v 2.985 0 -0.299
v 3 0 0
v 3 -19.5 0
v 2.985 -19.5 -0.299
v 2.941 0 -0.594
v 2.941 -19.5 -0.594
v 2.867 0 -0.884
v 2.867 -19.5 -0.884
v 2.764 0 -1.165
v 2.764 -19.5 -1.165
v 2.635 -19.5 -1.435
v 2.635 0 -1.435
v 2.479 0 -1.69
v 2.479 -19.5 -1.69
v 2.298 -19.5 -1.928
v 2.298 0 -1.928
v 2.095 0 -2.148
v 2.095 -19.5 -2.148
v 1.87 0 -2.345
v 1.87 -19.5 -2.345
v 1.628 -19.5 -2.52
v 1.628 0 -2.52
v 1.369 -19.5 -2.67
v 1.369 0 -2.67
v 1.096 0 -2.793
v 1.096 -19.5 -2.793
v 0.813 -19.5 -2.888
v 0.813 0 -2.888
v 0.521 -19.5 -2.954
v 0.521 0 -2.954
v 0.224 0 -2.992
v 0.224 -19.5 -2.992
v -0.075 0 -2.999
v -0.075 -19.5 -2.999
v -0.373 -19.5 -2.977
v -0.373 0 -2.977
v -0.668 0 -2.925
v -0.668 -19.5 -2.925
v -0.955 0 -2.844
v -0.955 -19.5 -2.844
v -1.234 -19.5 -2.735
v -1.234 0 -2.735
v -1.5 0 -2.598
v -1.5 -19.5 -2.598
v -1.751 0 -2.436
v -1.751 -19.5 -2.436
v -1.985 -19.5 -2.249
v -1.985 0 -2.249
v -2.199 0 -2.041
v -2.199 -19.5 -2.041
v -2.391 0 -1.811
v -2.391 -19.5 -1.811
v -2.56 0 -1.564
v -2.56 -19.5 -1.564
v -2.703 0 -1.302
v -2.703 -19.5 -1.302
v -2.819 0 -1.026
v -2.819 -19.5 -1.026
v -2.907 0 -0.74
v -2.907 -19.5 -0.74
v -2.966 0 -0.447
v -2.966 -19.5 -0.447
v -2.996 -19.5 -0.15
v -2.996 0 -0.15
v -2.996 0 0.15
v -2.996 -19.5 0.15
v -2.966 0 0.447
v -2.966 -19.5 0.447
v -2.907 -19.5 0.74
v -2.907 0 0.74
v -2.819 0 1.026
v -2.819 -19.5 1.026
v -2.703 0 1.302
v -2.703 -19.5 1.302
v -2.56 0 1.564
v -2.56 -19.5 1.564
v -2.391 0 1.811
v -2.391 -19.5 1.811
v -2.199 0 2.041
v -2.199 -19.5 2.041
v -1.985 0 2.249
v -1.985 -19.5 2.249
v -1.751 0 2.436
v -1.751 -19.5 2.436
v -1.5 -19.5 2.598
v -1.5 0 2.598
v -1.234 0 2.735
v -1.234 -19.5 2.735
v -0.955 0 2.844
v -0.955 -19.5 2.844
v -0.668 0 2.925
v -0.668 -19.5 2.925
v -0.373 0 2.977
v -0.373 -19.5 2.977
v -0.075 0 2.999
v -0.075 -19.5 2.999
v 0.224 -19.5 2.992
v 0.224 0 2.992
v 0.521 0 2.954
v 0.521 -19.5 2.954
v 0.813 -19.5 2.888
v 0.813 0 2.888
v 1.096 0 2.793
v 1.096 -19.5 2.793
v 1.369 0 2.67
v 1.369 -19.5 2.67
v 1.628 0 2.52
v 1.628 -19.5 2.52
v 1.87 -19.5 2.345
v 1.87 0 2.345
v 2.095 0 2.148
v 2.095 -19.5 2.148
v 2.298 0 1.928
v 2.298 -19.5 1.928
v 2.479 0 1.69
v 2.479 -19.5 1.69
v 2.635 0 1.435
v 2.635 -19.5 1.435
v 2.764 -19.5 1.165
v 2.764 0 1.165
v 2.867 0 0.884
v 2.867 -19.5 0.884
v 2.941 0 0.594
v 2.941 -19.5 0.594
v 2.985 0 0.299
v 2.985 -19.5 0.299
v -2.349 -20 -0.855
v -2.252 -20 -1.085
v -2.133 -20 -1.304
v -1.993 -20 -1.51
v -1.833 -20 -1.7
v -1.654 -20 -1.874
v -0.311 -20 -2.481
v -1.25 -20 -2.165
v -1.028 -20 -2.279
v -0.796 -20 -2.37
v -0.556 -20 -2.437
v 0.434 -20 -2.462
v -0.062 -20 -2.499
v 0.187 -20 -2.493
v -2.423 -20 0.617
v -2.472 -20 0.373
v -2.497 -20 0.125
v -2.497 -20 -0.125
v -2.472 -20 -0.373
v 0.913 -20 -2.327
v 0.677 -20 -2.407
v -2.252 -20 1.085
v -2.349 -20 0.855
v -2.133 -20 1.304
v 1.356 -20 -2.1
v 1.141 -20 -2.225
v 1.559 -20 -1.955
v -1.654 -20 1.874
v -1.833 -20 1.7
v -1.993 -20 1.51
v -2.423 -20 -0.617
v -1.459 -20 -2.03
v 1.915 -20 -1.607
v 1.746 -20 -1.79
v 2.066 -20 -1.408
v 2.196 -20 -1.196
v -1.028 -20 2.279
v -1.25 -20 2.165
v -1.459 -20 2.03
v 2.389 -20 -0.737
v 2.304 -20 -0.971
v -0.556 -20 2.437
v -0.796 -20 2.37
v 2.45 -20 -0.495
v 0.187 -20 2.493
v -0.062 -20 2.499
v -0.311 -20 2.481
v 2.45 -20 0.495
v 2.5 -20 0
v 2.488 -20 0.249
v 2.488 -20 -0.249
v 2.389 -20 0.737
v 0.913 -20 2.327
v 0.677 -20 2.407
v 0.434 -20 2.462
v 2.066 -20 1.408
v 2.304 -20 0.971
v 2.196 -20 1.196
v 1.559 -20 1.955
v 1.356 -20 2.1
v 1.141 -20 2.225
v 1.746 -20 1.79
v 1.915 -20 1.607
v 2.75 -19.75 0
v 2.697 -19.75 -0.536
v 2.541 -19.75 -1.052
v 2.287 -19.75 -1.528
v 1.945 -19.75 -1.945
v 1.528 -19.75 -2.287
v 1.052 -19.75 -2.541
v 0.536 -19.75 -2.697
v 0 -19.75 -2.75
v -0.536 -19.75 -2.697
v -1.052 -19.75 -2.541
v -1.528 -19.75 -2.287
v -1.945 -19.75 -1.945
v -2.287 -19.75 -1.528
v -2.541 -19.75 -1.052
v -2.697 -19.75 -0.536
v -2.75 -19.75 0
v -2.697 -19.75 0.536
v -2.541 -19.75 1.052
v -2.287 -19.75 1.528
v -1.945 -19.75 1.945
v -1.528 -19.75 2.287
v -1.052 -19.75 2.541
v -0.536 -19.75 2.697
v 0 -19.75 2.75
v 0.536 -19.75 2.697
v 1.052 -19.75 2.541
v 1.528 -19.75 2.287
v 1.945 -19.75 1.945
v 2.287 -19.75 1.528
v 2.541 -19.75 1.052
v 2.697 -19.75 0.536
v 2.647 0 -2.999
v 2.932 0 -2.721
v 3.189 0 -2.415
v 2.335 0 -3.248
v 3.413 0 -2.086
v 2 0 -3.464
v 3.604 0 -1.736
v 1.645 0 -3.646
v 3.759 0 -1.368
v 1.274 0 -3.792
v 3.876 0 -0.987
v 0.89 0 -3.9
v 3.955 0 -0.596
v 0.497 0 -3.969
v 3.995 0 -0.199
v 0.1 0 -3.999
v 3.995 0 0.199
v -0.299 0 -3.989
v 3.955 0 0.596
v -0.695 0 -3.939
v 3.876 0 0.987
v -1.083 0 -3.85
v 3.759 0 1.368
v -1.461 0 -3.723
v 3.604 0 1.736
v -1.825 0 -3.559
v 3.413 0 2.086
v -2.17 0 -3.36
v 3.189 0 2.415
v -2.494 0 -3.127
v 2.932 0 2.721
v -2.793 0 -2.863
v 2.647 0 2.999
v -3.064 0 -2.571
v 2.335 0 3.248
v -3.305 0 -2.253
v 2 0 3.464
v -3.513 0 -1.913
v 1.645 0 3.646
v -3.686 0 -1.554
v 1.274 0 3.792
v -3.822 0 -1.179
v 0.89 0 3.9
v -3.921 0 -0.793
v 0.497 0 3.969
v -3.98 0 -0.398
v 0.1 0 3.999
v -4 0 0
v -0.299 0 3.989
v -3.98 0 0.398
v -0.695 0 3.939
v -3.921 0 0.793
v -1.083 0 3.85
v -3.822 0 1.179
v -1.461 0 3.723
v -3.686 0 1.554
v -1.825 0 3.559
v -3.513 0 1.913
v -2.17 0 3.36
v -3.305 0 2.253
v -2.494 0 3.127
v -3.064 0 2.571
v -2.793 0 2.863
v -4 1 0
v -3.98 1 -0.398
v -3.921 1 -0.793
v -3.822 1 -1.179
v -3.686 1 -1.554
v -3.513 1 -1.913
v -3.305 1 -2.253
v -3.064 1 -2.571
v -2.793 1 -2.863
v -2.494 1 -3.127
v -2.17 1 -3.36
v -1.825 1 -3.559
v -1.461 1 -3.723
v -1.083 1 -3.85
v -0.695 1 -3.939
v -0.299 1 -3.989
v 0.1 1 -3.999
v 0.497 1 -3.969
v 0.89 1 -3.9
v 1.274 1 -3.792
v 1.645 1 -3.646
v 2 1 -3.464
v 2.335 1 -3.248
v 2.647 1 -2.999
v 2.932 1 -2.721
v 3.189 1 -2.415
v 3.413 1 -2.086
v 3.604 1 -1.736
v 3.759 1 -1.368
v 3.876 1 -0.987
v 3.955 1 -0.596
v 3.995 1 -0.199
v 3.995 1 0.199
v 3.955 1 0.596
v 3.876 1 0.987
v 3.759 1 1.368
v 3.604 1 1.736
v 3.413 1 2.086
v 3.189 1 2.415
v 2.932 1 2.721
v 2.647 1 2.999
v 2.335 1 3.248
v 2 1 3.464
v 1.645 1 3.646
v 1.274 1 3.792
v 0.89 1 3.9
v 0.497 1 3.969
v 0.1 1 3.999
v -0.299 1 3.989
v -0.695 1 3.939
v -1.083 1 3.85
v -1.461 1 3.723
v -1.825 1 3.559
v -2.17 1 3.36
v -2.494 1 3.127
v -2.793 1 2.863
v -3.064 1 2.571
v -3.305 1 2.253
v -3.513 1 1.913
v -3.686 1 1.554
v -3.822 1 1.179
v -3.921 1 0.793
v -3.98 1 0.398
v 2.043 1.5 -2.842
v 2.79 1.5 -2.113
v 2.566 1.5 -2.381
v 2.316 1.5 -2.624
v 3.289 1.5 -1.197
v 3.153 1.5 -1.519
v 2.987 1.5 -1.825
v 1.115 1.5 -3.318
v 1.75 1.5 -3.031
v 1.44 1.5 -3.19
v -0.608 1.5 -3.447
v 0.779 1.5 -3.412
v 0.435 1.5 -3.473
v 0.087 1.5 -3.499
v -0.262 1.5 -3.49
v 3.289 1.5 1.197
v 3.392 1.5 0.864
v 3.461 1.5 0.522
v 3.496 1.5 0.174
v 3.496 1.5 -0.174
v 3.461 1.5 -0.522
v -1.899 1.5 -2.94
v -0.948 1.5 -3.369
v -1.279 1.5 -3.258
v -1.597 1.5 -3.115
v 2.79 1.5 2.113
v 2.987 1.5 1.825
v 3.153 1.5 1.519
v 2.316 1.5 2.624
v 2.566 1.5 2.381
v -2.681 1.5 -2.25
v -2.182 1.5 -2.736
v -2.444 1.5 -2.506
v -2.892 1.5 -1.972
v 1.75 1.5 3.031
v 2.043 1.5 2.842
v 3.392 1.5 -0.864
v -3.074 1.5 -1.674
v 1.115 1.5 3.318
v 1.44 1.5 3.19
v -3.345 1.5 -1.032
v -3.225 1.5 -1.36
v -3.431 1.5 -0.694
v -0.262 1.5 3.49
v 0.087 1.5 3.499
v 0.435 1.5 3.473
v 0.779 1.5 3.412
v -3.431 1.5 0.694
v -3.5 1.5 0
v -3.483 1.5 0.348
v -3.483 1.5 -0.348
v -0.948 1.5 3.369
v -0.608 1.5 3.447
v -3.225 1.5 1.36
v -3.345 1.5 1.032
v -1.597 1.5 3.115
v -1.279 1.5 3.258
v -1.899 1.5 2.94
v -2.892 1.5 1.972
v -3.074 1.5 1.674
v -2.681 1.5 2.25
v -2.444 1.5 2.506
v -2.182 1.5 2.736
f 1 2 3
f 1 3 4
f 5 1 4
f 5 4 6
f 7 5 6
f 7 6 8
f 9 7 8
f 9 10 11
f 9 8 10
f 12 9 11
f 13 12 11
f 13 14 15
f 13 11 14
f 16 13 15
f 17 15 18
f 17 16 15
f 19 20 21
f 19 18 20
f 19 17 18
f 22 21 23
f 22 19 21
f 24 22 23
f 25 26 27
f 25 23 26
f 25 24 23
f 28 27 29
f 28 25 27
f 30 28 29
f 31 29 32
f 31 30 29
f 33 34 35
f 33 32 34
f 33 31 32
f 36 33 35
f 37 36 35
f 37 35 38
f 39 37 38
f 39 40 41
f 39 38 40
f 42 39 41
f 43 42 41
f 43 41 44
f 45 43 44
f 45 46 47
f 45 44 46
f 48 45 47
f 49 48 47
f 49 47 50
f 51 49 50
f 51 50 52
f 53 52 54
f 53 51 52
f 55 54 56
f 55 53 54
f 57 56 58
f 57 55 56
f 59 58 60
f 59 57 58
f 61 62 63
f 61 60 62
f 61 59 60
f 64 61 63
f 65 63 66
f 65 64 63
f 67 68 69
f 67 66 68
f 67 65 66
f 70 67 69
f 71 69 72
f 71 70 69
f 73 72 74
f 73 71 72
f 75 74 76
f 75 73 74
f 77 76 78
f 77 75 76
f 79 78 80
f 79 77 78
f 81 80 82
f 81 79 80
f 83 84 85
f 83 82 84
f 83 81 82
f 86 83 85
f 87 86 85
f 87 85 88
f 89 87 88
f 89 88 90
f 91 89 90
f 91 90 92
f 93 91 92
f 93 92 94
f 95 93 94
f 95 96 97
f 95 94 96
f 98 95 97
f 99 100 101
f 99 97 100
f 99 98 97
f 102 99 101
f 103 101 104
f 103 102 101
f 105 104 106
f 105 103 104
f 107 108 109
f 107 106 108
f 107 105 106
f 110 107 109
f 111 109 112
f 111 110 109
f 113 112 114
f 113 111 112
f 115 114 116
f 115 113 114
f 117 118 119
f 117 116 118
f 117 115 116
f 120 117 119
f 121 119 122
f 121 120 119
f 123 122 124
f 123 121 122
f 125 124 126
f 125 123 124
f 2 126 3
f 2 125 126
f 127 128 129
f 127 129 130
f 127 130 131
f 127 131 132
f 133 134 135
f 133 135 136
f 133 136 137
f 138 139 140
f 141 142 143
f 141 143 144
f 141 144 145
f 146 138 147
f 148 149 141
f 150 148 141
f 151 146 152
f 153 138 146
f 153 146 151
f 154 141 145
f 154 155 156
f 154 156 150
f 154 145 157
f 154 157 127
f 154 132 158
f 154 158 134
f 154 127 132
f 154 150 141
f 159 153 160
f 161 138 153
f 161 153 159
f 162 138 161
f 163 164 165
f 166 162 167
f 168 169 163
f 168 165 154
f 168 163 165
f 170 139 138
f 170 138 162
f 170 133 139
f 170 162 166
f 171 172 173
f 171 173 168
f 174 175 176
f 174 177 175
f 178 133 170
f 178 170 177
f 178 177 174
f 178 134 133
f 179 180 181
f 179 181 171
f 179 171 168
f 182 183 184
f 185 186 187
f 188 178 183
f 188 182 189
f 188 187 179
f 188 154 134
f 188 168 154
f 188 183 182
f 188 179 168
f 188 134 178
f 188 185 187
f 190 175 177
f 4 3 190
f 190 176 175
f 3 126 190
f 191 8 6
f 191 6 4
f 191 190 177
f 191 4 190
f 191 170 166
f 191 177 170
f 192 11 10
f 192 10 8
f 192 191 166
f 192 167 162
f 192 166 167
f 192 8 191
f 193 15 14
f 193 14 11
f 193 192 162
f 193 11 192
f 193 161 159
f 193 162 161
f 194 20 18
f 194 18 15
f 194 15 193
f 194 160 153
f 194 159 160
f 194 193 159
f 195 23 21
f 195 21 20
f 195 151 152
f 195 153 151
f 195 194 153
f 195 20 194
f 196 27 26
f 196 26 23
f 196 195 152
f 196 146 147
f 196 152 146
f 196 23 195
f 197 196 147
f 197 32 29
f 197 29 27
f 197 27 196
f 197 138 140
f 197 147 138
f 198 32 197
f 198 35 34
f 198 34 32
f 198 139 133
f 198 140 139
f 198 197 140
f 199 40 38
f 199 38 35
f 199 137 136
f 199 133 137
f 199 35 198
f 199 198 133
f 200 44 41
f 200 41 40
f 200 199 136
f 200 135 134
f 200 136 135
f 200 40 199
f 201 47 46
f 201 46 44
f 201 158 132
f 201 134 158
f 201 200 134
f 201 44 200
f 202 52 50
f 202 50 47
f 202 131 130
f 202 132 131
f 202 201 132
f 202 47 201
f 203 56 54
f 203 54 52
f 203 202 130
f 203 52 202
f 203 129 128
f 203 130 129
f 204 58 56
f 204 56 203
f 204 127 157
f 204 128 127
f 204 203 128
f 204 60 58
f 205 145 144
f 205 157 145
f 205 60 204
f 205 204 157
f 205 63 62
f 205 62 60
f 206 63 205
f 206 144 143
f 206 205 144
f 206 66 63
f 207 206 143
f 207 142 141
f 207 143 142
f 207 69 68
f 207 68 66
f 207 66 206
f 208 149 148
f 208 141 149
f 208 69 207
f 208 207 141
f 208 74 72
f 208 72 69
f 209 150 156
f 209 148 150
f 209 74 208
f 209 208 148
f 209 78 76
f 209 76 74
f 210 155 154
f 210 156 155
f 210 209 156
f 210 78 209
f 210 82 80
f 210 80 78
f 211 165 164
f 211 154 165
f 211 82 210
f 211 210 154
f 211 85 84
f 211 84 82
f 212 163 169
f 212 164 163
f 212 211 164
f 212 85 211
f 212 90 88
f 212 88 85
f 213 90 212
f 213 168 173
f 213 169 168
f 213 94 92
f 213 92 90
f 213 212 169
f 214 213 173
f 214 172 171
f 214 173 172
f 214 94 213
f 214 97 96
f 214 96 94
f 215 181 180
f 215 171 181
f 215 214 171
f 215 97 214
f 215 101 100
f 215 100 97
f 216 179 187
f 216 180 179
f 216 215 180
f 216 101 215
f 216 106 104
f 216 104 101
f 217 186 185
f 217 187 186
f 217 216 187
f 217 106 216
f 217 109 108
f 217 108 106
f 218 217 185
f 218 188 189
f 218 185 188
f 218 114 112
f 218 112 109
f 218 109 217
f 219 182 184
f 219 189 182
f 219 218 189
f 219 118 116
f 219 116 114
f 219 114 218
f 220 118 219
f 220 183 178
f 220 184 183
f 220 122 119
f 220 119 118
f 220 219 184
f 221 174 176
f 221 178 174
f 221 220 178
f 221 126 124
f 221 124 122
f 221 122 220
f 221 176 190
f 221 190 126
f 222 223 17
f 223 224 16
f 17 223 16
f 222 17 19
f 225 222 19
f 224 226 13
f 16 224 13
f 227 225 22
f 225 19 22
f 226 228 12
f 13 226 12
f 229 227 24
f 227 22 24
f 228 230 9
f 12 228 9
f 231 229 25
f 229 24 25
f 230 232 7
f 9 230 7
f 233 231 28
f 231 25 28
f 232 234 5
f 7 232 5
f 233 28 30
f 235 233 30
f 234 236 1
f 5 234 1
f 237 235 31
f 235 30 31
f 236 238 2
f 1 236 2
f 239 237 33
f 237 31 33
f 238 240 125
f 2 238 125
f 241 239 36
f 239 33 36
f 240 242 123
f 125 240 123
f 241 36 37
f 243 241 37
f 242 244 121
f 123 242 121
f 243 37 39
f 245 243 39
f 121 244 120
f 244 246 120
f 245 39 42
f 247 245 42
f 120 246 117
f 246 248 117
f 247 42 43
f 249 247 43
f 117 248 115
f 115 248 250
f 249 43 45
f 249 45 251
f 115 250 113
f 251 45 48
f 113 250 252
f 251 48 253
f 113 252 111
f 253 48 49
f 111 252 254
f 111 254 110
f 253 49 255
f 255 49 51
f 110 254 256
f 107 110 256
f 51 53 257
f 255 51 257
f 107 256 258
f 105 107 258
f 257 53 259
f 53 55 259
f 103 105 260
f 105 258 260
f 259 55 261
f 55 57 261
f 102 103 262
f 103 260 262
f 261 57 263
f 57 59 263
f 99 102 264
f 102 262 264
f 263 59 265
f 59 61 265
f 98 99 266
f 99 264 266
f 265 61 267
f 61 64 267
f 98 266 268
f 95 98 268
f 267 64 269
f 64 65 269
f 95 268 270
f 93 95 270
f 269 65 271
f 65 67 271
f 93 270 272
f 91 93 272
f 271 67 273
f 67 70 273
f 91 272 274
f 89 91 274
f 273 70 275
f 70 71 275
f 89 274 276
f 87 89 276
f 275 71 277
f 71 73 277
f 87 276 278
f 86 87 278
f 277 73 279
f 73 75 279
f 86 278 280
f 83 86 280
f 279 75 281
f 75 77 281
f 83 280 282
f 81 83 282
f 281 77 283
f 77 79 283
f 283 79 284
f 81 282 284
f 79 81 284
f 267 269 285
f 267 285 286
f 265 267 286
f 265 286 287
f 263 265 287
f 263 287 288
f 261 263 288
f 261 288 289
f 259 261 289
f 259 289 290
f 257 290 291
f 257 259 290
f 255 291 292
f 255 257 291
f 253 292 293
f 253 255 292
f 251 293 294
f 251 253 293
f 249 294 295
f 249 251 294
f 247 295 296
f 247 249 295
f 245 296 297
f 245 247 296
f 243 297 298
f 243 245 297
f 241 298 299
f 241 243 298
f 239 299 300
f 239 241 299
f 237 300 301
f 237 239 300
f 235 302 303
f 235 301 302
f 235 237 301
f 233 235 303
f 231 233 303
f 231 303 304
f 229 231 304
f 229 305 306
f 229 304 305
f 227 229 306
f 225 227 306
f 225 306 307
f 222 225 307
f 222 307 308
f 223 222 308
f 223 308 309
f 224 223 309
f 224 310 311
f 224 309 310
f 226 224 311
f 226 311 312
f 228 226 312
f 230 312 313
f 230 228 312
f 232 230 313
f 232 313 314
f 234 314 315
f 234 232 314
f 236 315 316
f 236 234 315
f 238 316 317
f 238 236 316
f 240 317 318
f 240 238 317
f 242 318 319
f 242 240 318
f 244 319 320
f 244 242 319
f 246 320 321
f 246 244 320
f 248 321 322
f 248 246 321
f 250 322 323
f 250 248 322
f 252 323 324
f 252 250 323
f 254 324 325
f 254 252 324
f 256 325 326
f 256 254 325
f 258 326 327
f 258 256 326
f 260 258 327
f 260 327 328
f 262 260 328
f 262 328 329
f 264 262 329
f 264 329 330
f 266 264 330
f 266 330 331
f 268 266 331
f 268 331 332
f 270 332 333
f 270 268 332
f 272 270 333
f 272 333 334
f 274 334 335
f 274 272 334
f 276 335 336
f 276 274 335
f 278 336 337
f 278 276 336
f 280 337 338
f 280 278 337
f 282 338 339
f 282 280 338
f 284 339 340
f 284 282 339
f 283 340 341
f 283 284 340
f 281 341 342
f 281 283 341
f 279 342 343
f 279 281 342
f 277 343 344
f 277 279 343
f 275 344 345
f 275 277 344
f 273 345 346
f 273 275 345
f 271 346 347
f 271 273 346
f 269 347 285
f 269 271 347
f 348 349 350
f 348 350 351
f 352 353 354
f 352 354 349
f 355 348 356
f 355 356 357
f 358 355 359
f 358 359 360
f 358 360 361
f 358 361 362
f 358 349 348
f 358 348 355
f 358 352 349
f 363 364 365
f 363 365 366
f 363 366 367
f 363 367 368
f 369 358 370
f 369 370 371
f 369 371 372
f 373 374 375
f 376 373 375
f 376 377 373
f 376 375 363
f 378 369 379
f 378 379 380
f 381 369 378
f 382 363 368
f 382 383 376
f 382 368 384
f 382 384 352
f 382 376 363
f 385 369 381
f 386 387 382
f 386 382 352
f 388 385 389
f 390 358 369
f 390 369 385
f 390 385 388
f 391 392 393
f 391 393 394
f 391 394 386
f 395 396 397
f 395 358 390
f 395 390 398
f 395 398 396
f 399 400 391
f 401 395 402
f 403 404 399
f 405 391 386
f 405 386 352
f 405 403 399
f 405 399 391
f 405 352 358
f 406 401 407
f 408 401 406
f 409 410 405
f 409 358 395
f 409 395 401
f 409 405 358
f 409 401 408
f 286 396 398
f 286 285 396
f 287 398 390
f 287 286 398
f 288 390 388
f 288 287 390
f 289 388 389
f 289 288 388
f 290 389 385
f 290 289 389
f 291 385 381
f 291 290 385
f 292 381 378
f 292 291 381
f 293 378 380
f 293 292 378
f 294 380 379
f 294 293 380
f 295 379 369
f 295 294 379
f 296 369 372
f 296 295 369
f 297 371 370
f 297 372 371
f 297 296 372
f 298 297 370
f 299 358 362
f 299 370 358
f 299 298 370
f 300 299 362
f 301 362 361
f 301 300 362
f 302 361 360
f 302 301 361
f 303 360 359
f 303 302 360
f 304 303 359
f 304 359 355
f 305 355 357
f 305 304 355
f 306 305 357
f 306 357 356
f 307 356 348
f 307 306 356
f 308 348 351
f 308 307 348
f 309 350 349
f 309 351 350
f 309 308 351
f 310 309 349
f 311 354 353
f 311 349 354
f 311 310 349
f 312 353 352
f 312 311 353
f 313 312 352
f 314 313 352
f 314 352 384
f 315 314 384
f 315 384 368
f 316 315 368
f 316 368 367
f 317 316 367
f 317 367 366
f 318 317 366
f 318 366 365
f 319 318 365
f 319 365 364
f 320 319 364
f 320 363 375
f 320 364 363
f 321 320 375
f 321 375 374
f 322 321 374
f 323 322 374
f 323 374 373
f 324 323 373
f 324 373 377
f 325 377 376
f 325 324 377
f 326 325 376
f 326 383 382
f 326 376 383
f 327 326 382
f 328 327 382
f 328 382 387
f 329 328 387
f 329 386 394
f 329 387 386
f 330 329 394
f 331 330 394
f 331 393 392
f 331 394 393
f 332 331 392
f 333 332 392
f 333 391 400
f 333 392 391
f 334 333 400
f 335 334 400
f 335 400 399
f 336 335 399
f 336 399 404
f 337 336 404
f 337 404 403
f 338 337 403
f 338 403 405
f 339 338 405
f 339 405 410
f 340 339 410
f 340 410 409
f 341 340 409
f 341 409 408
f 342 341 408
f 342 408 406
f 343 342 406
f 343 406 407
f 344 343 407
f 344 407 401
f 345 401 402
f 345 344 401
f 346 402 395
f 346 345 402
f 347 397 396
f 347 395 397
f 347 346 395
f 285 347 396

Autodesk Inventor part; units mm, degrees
ref_plane "YZ Plane" through (0, 0, 0) normal (1, 0, 0) x (0, 1, 0)
ref_plane "XZ Plane" through (0, 0, 0) normal (0, 1, 0) x (-1, 0, 0)
ref_plane "XY Plane" through (0, 0, 0) normal (0, 0, 1) x (1, 0, 0)
sketch "Sketch1" plane through (0, 0, 0) normal (0, 1, 0) x (-1, 0, 0)
  circle A0 centre (0, 0) radius 4
  dimension "d0" = 8
extrude "Extrusion1" add sketch "Sketch1" along normal blind 1.5
sketch "Sketch2" plane through (0, 0, 0) normal (0, -1, 0) x (1, 0, 0)
  circle A0 centre (0, 0) radius 3
  dimension "d4" = 6
extrude "Extrusion2" add sketch "Sketch2" along normal blind 20
chamfer "Chamfer1" distance 0.5 angle 45 1 edges at (4, 1.5, 0)
chamfer "Chamfer2" distance 0.5 angle 45 1 edges at (-3, -20, 0)
properties part number "reverse gear crankrod pin 1"
